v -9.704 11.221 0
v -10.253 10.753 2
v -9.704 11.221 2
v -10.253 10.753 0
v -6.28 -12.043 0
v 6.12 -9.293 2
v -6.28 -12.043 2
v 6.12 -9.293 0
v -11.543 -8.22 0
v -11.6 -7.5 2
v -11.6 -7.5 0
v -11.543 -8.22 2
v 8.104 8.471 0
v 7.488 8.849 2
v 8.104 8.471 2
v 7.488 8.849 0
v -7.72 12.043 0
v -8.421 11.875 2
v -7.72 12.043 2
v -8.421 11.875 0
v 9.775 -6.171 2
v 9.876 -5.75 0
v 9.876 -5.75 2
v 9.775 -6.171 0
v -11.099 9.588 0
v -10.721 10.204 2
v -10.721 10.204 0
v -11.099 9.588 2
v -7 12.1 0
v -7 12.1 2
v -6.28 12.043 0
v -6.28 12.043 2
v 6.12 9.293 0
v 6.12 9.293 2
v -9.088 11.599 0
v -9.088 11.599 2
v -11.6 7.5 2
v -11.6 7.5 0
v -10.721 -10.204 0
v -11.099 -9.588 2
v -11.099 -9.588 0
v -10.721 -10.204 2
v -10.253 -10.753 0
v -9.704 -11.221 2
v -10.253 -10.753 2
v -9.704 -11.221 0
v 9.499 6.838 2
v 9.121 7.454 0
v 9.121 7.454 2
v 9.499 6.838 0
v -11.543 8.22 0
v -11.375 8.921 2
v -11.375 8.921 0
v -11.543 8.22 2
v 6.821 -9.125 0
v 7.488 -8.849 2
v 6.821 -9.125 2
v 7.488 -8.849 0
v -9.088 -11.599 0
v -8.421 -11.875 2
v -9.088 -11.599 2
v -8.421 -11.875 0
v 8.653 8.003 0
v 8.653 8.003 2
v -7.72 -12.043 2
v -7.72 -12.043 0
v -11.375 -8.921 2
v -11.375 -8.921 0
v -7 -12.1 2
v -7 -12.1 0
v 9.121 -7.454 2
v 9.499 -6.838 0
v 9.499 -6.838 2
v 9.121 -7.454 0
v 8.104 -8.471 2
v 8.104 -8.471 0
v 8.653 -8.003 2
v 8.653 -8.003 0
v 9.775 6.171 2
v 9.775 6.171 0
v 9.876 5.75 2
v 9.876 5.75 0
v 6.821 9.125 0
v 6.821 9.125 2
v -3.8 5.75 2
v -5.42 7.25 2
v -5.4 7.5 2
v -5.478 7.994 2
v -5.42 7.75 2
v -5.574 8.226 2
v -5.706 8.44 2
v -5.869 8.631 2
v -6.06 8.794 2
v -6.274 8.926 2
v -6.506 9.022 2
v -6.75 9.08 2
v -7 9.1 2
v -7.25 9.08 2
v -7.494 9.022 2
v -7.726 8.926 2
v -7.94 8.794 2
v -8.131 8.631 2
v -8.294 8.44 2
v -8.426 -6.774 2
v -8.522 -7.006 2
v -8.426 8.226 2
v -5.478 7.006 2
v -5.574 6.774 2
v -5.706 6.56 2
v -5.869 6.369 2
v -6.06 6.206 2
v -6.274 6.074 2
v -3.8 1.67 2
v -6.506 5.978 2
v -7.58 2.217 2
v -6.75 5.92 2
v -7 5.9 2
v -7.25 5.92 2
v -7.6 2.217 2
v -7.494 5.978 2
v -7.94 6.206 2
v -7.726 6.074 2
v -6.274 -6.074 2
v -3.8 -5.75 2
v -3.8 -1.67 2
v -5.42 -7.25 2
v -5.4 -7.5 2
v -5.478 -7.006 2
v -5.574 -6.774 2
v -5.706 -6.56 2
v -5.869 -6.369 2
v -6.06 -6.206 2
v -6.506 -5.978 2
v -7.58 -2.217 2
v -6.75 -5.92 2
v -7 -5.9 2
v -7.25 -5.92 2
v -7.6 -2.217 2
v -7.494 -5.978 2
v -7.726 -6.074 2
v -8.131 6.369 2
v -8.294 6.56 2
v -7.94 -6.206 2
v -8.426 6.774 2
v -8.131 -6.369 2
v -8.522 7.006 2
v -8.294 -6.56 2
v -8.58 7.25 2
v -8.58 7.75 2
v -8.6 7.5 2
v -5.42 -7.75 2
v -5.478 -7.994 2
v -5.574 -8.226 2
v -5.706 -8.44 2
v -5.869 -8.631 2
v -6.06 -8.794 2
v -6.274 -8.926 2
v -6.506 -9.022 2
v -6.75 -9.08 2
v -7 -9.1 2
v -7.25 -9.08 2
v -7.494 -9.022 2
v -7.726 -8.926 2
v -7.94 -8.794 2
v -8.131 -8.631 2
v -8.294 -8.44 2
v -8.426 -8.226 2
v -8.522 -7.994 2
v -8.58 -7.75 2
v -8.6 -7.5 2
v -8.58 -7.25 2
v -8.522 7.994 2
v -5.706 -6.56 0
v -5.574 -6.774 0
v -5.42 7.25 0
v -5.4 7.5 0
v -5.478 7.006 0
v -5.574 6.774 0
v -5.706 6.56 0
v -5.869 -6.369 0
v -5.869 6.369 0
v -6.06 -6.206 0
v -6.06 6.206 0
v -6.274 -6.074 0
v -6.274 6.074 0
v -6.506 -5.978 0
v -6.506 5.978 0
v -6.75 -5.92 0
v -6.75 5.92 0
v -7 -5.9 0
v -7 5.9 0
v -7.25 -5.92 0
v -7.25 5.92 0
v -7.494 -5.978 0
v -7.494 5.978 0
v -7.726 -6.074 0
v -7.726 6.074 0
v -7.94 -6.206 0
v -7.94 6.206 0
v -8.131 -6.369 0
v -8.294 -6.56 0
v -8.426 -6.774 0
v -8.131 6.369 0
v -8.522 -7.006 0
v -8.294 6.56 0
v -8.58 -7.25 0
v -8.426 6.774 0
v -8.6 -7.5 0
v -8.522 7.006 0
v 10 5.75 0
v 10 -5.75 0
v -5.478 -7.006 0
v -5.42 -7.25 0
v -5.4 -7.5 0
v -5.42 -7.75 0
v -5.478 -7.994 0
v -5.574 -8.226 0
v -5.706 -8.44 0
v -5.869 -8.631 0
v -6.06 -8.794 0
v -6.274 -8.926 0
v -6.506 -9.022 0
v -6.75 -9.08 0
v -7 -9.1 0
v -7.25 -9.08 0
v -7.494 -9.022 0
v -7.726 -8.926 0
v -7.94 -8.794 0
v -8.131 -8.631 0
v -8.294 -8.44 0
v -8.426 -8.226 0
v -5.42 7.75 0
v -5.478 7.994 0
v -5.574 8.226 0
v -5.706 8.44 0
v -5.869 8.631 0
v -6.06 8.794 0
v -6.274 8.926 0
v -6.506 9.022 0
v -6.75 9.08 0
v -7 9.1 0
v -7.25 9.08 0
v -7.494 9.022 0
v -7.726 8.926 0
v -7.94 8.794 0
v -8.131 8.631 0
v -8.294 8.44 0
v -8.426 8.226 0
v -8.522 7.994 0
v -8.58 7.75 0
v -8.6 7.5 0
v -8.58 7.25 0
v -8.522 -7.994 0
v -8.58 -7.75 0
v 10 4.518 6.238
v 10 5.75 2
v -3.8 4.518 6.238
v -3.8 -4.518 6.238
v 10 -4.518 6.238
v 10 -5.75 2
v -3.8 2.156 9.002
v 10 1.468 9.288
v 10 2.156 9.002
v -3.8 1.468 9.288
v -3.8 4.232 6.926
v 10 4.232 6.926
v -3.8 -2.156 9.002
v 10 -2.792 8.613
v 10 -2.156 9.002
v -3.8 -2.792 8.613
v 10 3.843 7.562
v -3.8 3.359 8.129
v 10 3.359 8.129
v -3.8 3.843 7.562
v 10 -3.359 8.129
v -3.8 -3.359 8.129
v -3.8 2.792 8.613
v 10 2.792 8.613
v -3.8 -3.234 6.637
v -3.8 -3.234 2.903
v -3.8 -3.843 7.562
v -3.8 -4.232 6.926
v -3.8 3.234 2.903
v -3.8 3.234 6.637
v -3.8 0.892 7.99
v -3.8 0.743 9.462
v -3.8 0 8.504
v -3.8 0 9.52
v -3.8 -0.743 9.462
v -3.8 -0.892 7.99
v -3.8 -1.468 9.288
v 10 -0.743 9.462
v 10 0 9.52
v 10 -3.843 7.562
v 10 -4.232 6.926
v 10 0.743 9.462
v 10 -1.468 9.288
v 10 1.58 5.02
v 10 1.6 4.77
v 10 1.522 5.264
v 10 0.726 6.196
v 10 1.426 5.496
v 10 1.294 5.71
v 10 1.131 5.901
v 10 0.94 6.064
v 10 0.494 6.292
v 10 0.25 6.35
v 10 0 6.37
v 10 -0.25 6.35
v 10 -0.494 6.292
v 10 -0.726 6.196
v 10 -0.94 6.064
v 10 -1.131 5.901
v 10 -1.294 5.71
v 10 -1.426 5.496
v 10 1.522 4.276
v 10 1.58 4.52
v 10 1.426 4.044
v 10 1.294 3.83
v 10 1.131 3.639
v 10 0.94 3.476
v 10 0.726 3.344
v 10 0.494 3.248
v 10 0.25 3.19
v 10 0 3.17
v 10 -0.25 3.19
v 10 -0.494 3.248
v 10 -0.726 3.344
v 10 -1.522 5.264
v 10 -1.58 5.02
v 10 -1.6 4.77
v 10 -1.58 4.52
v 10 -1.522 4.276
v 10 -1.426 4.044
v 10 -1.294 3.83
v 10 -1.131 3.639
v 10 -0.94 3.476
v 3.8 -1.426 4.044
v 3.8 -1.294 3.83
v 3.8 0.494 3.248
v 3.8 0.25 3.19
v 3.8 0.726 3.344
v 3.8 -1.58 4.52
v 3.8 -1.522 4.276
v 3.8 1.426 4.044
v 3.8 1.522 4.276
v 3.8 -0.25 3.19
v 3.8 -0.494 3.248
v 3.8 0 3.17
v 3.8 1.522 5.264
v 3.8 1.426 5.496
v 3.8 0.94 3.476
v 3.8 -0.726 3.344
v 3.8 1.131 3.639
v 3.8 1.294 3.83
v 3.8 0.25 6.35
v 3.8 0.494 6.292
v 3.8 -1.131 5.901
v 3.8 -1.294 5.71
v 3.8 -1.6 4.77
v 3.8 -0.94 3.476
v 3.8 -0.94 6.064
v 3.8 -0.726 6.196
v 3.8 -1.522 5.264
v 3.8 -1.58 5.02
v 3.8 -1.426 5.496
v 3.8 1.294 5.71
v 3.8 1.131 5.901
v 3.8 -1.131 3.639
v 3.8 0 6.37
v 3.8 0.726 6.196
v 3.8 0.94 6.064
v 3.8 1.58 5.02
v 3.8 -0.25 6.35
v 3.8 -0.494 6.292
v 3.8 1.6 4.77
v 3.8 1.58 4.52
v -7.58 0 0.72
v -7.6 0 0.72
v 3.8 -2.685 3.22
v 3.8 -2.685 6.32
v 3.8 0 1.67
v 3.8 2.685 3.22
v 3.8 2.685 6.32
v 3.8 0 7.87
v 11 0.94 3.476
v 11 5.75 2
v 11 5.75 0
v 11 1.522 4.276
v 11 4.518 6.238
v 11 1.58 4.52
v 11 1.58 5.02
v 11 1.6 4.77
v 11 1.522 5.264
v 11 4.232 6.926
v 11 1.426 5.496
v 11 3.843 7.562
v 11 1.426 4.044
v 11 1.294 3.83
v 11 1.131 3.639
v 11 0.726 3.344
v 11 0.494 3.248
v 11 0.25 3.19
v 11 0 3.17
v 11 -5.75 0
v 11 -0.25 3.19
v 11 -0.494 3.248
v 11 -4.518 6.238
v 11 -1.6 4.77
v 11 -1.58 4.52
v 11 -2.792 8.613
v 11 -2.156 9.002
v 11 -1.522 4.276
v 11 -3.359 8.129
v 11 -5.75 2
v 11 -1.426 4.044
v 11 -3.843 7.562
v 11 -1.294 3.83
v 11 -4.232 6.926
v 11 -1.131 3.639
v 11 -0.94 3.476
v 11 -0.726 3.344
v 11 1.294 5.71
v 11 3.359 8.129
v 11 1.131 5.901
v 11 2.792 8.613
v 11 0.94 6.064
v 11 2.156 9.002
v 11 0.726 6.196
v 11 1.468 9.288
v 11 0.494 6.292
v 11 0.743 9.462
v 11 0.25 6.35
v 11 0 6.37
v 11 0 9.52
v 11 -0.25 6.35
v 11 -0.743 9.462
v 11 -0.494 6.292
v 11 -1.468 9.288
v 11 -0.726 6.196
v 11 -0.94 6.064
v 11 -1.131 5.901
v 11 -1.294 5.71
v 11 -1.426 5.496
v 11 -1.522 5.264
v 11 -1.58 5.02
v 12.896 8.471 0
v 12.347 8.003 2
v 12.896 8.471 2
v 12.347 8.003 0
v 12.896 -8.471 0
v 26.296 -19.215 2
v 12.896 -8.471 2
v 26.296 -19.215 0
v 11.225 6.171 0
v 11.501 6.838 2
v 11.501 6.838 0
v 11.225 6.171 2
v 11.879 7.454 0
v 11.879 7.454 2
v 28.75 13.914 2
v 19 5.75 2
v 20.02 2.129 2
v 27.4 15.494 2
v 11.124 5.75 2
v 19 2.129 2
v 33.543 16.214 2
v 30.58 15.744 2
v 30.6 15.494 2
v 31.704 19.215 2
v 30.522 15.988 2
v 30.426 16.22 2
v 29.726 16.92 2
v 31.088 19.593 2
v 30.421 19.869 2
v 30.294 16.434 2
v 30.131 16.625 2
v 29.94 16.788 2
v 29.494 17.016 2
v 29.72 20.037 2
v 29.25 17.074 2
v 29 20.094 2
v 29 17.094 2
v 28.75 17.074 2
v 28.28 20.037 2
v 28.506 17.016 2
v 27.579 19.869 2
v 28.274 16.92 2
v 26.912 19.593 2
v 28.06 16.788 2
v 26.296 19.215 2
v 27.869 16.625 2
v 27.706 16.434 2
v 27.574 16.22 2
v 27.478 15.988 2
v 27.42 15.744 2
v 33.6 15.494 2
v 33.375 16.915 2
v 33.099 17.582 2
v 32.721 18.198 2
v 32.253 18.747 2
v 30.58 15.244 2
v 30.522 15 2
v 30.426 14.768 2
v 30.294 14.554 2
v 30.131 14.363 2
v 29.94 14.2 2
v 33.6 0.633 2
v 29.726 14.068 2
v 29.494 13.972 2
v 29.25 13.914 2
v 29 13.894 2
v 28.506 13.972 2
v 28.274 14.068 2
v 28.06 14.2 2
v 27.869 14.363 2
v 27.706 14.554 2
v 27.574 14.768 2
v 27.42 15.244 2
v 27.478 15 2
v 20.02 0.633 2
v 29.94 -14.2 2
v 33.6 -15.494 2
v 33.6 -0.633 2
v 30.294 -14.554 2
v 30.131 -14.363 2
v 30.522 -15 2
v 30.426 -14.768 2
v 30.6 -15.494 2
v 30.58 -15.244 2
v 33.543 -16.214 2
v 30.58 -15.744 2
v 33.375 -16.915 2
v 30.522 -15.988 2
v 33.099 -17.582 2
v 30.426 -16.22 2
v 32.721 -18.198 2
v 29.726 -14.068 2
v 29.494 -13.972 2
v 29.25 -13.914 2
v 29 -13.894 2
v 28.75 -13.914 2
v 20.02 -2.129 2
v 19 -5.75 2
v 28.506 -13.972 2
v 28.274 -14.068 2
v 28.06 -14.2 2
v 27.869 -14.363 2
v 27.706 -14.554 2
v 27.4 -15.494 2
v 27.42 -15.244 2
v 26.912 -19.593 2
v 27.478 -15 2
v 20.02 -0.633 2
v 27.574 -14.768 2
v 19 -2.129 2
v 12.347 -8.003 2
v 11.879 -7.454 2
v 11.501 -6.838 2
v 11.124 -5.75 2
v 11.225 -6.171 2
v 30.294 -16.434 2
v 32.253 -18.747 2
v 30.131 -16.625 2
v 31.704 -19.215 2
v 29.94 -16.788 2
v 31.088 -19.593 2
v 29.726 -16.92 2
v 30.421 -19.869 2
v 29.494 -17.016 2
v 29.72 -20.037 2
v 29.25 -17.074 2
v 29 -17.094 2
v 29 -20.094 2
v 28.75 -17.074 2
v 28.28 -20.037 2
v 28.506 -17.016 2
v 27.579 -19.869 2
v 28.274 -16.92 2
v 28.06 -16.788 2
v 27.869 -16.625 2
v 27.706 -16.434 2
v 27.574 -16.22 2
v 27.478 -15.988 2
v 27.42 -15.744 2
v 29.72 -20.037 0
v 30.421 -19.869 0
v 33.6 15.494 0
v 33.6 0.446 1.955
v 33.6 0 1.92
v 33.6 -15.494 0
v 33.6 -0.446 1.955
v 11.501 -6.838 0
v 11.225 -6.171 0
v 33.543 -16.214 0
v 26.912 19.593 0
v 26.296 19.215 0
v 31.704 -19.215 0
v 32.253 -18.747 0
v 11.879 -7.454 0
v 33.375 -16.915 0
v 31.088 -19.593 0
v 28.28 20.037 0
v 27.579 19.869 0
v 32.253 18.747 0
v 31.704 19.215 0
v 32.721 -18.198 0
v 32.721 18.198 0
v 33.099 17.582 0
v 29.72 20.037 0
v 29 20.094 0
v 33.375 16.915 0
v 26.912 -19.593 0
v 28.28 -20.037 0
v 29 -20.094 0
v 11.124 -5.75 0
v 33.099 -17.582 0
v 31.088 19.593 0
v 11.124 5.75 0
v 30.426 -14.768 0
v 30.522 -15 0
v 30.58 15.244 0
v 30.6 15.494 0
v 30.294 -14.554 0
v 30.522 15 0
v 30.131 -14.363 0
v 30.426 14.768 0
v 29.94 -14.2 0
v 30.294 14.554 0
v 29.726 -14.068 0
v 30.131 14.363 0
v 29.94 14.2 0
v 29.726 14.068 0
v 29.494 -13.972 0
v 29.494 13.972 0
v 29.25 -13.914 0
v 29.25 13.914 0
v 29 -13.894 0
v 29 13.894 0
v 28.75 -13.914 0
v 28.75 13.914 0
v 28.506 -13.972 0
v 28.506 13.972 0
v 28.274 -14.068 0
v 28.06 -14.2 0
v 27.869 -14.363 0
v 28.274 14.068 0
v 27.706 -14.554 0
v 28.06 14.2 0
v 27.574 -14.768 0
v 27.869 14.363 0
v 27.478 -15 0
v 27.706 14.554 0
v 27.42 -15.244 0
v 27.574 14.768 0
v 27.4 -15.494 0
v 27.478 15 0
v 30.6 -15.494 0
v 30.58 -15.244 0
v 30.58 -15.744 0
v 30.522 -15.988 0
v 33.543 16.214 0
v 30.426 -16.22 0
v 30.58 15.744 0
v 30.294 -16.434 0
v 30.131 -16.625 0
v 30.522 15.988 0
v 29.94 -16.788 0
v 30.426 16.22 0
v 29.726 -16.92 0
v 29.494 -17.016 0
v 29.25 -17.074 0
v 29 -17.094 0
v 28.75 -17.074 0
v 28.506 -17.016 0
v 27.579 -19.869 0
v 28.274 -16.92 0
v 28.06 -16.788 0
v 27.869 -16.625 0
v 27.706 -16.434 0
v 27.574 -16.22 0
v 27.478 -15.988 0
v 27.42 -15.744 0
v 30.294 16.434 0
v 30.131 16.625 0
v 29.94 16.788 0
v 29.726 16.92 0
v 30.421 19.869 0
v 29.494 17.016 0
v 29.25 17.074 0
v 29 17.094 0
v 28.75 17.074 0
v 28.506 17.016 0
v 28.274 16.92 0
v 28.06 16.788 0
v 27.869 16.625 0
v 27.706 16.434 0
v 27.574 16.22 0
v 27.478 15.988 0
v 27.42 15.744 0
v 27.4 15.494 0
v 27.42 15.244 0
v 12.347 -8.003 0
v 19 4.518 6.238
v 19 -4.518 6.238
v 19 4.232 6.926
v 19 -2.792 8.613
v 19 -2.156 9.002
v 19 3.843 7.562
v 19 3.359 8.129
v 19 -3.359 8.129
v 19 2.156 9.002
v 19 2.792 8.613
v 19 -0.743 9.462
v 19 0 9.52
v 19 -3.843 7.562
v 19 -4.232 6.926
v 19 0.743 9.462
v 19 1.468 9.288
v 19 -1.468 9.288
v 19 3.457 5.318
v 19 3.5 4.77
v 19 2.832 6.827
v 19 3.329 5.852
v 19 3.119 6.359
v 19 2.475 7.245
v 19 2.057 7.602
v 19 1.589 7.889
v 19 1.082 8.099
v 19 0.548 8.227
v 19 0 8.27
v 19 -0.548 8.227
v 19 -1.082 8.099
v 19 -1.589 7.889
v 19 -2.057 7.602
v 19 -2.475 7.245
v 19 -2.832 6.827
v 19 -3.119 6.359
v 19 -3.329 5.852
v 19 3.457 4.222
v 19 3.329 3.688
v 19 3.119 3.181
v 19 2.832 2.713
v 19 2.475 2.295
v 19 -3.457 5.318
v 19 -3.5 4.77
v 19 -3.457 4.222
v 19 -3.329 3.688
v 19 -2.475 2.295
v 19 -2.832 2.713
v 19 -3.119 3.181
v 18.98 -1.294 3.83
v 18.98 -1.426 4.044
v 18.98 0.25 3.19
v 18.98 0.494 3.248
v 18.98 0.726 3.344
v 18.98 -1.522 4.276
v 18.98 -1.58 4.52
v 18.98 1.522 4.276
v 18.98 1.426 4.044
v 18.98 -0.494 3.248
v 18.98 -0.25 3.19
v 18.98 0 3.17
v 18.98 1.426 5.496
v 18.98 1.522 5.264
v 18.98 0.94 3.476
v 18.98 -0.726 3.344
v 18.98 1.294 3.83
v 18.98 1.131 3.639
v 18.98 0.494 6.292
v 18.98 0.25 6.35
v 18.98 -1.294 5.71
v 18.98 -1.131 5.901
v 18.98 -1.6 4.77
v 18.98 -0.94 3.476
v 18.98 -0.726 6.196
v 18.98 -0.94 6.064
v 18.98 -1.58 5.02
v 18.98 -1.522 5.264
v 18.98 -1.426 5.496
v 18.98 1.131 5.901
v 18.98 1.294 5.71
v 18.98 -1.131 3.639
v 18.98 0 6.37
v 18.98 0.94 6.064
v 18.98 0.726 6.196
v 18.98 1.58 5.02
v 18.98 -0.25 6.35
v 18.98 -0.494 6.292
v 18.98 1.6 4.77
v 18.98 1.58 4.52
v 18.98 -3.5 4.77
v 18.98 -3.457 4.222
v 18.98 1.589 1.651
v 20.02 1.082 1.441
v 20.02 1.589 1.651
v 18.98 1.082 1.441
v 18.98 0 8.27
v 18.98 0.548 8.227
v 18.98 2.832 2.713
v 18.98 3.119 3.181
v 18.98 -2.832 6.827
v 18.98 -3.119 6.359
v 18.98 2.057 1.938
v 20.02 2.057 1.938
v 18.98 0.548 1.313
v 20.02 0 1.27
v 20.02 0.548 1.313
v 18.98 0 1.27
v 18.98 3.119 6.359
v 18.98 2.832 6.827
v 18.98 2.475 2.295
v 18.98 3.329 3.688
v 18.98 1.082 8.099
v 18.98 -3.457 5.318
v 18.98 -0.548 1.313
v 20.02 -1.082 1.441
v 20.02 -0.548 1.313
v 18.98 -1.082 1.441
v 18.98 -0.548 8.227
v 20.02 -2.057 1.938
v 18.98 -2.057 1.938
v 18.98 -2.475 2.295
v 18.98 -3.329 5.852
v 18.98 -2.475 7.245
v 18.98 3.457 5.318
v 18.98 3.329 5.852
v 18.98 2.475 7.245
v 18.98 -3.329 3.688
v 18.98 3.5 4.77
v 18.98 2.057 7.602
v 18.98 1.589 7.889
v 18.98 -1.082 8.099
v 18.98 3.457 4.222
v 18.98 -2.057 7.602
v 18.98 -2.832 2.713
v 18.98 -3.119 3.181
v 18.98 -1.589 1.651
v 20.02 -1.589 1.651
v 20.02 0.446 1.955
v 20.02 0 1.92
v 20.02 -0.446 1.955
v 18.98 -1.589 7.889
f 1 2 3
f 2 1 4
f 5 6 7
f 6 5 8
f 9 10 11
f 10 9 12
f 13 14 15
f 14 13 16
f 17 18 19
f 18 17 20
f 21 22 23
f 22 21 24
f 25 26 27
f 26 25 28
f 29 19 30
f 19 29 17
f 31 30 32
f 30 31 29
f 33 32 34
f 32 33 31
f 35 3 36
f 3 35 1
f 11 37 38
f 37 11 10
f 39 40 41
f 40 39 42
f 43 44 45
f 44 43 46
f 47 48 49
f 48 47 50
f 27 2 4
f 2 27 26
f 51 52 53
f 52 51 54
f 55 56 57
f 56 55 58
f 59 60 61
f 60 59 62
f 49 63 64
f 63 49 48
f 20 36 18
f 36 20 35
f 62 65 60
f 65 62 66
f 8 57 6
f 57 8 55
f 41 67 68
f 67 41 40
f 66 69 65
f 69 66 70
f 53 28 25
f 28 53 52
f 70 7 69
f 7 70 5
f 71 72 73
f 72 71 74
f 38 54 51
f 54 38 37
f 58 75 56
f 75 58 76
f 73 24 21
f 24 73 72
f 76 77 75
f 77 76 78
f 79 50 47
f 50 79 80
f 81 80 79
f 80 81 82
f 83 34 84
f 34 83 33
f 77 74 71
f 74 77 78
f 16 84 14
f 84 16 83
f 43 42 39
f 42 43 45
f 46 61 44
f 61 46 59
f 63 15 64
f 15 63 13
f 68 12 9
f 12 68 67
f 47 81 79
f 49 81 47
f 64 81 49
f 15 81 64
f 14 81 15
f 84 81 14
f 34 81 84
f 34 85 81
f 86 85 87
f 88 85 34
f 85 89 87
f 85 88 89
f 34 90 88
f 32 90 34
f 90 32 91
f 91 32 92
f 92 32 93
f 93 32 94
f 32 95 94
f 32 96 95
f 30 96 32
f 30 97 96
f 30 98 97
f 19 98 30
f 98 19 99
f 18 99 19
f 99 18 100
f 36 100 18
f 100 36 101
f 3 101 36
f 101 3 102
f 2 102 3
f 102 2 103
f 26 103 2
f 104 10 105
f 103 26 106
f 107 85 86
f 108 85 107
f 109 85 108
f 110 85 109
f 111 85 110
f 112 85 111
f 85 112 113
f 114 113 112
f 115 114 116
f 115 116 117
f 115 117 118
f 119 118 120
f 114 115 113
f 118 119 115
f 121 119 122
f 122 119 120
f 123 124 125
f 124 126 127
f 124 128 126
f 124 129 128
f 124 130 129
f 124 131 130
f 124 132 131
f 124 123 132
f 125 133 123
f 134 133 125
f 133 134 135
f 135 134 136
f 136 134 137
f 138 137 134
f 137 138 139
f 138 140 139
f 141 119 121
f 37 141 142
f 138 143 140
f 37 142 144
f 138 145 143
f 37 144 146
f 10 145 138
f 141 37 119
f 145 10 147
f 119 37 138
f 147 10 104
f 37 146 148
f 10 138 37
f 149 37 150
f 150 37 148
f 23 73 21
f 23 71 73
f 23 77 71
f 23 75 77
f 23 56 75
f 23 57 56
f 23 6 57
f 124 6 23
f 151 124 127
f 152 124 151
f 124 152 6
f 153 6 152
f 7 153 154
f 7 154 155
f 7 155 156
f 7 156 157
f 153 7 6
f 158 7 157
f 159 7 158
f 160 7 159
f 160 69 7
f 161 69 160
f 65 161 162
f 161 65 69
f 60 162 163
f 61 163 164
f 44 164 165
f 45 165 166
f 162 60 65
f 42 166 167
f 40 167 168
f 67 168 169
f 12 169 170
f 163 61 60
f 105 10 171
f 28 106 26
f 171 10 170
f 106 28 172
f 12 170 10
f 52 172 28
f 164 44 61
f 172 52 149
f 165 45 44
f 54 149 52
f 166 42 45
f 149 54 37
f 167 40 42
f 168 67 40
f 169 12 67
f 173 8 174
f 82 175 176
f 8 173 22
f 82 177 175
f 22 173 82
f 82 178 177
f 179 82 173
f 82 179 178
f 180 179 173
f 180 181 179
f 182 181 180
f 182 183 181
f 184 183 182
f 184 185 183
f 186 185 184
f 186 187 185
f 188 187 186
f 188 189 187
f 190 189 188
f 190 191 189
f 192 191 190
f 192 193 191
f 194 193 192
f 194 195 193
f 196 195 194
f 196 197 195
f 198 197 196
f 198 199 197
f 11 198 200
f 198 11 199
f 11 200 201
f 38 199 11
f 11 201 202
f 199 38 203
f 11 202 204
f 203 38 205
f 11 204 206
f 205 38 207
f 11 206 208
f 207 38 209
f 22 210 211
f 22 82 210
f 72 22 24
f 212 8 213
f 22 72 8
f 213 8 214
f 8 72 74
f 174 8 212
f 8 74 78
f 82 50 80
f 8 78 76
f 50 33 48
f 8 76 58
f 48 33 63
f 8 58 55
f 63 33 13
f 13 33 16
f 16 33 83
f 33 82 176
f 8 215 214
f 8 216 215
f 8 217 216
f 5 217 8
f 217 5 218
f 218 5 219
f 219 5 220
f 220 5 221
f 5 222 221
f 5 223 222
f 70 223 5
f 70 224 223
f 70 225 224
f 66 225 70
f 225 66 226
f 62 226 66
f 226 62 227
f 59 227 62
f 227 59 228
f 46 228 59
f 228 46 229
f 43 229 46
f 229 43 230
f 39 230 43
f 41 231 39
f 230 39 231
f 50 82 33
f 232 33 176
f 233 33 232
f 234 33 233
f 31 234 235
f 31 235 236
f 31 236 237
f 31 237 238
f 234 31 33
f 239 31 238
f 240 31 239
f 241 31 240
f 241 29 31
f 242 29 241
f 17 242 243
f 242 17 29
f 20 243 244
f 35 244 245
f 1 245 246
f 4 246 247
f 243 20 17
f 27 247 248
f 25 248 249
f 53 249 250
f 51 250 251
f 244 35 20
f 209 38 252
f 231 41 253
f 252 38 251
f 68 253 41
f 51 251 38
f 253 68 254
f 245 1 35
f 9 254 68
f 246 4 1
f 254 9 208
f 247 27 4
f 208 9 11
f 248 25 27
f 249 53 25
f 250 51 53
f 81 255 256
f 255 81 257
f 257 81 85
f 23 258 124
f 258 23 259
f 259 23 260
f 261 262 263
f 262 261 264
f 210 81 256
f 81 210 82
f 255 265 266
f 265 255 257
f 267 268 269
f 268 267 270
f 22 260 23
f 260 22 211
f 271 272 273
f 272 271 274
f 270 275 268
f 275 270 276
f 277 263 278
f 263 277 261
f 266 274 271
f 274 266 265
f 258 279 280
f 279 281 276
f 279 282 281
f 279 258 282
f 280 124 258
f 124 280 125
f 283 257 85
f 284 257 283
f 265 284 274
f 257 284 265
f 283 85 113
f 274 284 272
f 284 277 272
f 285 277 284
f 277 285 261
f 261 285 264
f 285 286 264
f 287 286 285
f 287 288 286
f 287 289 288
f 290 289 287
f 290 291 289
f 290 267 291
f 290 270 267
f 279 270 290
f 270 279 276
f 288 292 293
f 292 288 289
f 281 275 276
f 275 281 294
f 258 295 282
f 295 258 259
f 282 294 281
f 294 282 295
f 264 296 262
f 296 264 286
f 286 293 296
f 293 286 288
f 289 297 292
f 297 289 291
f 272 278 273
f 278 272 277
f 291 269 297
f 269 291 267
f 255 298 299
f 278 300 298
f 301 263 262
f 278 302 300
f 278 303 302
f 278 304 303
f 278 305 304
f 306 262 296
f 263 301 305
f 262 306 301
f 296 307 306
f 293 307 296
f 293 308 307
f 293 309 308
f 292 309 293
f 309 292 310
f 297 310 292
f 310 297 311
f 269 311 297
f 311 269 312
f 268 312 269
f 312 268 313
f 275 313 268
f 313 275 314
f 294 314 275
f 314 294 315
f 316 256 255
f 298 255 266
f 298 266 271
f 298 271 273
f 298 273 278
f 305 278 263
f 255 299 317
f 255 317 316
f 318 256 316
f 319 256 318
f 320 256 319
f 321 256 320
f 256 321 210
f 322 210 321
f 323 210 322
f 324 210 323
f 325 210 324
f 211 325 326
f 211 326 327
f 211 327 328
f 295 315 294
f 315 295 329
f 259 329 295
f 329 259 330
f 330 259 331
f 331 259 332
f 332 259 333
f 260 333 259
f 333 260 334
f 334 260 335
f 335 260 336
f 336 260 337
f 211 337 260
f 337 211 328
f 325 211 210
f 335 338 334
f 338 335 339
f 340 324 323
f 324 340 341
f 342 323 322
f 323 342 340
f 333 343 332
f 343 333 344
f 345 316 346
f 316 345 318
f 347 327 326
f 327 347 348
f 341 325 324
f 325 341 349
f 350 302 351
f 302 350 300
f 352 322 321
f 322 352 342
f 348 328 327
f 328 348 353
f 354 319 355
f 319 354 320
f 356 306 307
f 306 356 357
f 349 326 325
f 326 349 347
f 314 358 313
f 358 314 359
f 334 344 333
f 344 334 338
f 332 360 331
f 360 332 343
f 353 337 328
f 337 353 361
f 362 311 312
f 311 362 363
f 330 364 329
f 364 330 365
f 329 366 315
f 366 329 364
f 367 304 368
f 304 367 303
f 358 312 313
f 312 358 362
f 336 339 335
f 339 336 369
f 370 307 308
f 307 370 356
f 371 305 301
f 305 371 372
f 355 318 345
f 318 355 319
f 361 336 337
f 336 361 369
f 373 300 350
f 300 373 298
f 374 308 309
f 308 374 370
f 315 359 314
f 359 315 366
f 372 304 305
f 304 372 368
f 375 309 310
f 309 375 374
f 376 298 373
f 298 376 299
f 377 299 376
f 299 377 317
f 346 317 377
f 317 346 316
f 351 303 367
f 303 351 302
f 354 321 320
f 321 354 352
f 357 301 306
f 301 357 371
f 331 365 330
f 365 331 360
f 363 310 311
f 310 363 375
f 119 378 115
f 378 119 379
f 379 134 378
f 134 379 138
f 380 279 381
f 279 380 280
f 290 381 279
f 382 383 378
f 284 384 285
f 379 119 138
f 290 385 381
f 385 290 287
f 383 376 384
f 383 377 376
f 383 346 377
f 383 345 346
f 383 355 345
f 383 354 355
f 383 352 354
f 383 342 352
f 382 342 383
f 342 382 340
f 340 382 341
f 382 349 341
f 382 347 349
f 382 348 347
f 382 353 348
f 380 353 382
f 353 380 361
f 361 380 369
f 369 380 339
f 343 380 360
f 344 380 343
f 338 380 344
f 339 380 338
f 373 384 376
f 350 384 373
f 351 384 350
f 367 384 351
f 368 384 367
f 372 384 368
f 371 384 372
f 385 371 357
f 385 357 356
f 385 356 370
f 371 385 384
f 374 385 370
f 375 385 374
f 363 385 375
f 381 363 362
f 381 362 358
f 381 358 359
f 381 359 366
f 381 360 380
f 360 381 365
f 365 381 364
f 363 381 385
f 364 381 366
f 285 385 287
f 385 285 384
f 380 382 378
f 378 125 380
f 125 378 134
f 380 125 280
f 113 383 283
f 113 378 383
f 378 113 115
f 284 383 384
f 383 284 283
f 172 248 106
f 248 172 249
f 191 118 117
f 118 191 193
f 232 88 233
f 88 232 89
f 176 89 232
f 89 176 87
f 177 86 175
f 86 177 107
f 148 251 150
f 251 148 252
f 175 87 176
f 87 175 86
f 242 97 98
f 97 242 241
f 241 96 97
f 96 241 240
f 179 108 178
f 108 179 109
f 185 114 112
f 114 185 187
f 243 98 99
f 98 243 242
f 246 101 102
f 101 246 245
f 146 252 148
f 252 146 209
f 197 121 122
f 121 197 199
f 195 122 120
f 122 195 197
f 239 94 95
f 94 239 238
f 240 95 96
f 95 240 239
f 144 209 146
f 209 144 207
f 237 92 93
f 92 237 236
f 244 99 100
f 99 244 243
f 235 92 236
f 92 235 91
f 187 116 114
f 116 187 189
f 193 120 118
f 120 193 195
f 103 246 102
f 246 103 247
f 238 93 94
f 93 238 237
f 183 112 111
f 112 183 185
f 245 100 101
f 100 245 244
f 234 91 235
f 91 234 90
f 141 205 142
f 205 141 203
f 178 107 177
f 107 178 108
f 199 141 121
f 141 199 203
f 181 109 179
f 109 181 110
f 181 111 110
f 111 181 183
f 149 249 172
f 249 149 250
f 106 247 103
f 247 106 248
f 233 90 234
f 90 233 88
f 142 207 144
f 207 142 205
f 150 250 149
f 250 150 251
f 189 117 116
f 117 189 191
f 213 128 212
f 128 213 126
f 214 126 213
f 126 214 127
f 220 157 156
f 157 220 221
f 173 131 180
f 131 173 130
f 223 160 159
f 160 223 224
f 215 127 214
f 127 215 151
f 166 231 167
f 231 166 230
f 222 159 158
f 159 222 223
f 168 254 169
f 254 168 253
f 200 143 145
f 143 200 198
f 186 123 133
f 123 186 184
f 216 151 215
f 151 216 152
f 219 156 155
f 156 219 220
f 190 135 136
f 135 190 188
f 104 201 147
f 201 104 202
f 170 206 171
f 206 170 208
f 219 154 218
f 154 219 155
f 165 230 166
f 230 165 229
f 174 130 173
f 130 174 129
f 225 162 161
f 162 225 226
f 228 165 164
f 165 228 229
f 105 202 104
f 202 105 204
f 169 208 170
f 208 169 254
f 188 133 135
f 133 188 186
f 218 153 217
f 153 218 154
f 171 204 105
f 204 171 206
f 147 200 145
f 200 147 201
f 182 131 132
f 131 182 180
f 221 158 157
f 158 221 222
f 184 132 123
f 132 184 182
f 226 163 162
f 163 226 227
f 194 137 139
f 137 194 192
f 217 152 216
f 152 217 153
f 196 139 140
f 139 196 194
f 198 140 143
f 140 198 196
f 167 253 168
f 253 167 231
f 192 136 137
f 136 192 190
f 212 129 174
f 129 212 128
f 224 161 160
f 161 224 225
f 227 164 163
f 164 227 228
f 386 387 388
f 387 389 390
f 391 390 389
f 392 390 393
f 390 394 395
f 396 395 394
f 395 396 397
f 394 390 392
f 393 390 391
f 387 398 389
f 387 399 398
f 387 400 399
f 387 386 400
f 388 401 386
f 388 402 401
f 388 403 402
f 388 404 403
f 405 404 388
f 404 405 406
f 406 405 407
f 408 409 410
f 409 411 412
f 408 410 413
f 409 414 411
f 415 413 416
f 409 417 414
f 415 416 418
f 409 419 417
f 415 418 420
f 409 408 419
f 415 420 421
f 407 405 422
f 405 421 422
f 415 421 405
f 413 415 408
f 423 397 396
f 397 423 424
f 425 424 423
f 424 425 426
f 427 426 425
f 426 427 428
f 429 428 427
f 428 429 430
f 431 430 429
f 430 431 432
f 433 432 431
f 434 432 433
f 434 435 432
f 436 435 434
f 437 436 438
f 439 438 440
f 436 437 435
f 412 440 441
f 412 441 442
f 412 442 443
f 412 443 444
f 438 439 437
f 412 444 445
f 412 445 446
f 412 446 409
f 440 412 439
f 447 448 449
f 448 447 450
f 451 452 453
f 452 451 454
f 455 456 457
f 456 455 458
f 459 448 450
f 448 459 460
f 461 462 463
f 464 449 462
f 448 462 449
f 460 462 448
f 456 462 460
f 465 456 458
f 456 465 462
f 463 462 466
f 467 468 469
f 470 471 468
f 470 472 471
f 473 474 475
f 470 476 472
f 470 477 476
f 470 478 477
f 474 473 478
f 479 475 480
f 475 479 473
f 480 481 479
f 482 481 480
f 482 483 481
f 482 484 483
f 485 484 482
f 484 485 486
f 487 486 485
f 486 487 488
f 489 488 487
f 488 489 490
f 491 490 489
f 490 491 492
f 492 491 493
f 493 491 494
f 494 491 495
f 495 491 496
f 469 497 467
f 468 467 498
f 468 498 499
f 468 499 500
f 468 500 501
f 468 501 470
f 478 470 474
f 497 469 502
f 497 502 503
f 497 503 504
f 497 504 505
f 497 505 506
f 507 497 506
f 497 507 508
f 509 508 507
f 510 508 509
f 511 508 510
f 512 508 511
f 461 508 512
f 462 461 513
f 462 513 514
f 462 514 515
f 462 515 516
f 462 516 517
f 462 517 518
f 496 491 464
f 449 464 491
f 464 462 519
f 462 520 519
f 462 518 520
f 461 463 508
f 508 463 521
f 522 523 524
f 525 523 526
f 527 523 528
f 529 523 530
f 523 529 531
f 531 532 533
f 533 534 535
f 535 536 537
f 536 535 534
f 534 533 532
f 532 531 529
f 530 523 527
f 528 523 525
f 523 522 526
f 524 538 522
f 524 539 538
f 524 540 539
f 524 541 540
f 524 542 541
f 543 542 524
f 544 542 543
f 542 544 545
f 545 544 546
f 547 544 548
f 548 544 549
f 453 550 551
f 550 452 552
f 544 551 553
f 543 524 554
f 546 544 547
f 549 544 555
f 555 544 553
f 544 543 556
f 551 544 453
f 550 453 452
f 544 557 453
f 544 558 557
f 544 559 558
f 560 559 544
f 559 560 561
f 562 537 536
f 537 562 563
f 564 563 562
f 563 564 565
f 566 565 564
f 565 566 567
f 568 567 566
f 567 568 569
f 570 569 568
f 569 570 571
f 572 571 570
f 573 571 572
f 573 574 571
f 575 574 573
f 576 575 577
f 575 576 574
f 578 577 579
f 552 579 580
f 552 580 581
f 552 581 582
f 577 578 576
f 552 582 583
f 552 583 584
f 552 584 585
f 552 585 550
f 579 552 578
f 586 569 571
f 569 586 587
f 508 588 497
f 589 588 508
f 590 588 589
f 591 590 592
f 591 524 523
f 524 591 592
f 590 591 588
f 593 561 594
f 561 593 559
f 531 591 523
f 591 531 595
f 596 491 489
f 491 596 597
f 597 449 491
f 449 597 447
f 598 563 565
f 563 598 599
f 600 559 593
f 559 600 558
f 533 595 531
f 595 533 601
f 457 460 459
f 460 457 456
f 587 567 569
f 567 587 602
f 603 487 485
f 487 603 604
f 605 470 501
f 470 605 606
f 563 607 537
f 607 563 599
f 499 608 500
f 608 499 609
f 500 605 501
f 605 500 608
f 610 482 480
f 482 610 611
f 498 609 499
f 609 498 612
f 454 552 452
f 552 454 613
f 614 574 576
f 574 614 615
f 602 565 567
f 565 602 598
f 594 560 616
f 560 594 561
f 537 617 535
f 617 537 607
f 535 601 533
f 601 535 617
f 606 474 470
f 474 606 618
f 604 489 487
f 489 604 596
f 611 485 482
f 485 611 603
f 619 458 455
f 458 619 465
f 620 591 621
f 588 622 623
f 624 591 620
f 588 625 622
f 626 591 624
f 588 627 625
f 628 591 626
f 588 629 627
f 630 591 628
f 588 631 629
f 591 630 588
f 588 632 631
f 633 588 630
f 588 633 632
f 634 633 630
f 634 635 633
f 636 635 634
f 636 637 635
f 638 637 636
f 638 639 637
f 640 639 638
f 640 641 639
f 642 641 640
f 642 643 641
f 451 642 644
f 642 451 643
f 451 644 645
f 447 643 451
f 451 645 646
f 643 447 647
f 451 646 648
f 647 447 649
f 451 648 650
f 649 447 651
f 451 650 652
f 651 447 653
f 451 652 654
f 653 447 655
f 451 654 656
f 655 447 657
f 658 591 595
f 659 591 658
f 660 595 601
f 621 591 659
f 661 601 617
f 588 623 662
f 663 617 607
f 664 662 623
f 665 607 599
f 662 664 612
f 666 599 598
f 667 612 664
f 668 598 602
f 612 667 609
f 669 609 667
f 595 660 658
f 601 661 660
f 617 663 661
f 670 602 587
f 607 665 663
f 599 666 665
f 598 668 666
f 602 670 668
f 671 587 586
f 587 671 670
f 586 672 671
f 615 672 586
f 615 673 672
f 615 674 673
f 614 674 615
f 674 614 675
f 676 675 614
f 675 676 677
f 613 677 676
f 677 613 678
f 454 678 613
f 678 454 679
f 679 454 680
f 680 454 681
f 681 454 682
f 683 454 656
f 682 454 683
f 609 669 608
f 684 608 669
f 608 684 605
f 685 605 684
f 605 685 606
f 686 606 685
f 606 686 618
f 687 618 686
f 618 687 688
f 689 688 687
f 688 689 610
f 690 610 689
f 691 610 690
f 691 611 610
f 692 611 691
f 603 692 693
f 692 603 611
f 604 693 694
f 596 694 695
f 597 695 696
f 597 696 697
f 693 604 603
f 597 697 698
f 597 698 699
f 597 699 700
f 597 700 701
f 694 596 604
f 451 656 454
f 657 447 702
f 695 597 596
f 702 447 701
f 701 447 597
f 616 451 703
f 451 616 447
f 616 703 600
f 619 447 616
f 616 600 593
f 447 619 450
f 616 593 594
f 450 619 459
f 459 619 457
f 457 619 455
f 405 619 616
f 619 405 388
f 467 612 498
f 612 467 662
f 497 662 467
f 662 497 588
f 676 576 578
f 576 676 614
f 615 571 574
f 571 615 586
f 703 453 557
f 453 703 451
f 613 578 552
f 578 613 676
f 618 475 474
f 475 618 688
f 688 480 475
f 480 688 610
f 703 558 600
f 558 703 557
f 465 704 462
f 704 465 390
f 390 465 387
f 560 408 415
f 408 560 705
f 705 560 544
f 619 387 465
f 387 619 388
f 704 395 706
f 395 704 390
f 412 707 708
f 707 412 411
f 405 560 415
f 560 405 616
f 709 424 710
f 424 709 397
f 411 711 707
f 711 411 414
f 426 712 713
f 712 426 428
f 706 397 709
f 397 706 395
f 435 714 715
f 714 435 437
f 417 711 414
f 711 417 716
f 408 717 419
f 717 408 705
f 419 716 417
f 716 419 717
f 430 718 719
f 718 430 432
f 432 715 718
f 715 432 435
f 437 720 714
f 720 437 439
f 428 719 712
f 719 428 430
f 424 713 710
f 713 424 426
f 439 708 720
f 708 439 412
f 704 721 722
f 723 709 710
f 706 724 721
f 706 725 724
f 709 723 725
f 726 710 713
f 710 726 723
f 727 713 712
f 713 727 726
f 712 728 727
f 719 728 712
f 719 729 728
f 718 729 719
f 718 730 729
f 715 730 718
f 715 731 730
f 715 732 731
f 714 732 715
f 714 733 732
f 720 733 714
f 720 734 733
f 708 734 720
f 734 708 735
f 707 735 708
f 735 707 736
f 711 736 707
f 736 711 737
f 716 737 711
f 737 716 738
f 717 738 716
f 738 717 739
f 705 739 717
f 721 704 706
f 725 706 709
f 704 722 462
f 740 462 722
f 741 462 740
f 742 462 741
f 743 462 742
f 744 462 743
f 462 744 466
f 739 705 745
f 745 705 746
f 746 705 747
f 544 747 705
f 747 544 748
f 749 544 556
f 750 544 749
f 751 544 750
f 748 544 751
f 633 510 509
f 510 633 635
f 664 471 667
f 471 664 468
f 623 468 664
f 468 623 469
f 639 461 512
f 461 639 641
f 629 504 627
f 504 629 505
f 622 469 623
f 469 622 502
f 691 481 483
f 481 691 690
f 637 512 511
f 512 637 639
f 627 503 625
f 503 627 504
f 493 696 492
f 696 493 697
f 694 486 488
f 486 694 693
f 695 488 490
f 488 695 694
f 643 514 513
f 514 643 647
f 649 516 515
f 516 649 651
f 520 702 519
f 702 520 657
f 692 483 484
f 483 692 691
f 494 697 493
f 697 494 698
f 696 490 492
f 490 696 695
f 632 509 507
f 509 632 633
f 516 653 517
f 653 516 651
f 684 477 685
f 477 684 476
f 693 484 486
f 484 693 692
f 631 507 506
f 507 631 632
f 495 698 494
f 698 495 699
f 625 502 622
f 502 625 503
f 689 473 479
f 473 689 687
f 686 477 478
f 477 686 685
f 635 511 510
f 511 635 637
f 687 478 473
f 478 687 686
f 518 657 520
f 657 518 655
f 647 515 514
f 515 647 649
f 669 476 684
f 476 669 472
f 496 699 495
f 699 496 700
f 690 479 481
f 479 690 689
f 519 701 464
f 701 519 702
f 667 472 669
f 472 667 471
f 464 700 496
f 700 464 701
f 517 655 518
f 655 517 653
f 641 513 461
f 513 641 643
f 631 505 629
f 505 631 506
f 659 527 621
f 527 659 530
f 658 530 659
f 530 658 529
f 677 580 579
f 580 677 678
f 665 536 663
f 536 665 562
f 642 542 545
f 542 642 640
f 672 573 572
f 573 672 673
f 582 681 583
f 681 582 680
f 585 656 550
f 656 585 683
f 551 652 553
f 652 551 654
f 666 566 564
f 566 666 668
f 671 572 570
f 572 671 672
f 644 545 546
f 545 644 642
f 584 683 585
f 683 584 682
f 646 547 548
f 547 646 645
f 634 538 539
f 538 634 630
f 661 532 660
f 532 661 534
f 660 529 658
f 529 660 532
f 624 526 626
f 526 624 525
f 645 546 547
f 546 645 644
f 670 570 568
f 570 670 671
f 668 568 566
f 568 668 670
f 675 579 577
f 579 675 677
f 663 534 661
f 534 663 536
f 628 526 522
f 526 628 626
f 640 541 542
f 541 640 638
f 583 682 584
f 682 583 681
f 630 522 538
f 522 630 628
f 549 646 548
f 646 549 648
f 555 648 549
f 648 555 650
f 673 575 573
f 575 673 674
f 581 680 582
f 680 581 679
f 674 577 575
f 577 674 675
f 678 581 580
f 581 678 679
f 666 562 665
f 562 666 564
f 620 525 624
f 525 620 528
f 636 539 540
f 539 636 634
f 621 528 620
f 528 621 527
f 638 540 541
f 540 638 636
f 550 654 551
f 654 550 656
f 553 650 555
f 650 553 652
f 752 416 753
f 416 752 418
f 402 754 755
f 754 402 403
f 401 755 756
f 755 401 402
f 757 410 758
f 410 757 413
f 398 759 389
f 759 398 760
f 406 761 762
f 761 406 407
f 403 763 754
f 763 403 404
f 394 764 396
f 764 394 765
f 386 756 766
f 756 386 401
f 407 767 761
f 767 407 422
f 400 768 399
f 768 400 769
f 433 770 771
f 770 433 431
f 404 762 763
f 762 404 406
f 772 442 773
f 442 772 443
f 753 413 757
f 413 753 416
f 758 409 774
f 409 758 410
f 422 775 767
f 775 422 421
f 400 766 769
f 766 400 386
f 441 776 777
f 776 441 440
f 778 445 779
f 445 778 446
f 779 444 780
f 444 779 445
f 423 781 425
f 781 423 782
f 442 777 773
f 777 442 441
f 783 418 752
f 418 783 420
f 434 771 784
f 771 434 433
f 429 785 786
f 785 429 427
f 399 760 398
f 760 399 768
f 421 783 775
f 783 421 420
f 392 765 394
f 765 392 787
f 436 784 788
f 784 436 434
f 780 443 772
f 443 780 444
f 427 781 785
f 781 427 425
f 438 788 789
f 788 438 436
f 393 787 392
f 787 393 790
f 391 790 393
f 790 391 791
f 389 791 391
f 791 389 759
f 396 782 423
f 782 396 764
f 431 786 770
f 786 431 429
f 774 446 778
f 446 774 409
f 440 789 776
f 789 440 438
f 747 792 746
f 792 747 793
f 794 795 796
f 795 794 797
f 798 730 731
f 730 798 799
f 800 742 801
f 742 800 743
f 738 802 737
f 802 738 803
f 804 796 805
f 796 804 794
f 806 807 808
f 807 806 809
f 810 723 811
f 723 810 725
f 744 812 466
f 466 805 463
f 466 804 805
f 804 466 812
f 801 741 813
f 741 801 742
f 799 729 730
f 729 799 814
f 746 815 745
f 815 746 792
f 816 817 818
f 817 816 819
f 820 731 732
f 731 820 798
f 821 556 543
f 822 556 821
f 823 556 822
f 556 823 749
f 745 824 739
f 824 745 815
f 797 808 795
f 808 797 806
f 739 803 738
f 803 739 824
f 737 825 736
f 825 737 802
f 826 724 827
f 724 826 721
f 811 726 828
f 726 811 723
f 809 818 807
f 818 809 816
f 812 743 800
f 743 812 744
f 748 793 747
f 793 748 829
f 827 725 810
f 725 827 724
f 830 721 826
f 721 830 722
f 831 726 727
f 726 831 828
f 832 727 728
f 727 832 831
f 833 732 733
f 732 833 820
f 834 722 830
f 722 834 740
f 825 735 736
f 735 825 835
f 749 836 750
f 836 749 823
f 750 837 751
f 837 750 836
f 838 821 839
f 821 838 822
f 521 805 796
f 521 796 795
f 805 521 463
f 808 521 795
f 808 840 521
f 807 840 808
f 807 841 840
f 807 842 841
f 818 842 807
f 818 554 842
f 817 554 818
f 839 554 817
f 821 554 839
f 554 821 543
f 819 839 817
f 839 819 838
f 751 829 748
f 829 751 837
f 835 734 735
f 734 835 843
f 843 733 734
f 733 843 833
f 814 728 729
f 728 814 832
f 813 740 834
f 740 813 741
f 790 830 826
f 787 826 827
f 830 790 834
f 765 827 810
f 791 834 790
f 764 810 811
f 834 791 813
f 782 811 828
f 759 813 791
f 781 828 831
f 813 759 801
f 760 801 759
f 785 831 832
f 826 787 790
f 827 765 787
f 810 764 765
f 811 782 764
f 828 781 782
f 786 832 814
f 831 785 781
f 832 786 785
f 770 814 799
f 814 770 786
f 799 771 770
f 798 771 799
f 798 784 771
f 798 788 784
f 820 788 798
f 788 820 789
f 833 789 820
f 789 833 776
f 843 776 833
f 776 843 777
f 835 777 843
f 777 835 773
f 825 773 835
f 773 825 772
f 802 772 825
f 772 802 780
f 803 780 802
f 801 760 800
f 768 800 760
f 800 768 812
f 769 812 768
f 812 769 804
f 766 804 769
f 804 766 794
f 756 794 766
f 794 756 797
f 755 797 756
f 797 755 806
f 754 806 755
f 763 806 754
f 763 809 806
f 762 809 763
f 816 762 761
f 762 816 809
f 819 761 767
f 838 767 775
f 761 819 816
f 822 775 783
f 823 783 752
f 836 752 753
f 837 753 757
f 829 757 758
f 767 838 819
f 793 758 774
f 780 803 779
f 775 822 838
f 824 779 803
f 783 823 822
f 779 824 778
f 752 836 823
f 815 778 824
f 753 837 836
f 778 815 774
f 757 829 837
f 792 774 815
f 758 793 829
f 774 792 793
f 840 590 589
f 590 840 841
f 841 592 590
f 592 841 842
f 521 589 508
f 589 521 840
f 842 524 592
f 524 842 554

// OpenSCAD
//
// stepper_tensioner (rev 3) - 20121118-1017
//
// (c)Jeremie Francois (jeremie.francois@gmail.com)
//	http://www.thingiverse.com/MoonCactus
//	http://betterprinter.blogspot.com
//
// Licence: Attribution - Share Alike - Creative Commons
//

$fn=40;
tol=0.02;

main_th= 2; // base plate thickness

m3_d= 3;
m3_d_free= 3 + 0.2;
m3_head_d= 5.5 + 0.2;
m3_nylock_th= 3.8;
m3_nylock_d= 6.1 + 0.1;
m3_nylock_d_freeplay= 6.1 + 2.0;
m3_washer= 6.8 + 0.2;
m3_washer_th= 0.5 + 0.5;

holder_margin= 3; // margin around screw holes
balance_distance= 3; // leave some length on the motor side!
idle_holder_len= 8; // how long is the "tunnel" that hold the screw head
lock_holder_len= 10; // how long is the "tunnel" that hold nylock nut

// Swap the two spacing_xxx and set balance to zero if you want the adjustment screw head to point downwards
spacing_lock_side= 15; // narrow side
hole_d_lock_side= m3_d_free;

// NEMA 17 dimensions
spacing_idle_side= 1.220*2.54*10; // mounting holes distance (31mm)
hole_d_idle_side= m3_d_free; // add 6mm for a piece of bowden as thermal insulator

// How thick are the walls around the adjusting screw
holder_nut_wall_th= 9.5; // must be > m3_washer

// Misc computed dimensions
holder_width= holder_nut_wall_th/2;
motor_margin= 10-balance_distance;
idle_holder_hole_x= 15 + balance_distance;
ear_r= hole_d_lock_side/2+holder_margin;

module motor_side()
{
	difference()
	{
		union()
		{
			difference()
			{
				union()
				{
					// The motor plate
					hull()
					{
						translate([-motor_margin,0,0])
						{
							translate([0,+spacing_lock_side/2,0]) cylinder(r=ear_r, h=main_th);
							translate([0,-spacing_lock_side/2,0]) cylinder(r=ear_r, h=main_th);
						}
						translate([lock_holder_len-ear_r,0,0])
						{
							translate([0,+holder_width,0]) cylinder(r=ear_r, h=main_th);
							translate([0,-holder_width,0]) cylinder(r=ear_r, h=main_th);
						}
					}
					// The screw nest on the motor plate
					translate([-m3_nylock_th,0,0])
						screw_nest(lock_holder_len + m3_nylock_th);
				}
				// The m3 void
				translate([lock_holder_len-lock_holder_len-tol,0,holder_nut_wall_th/2+tol])
					rotate([0,90,0])
						cylinder(r=m3_d_free/2, h= lock_holder_len+20);

				// The m3 nylock hole
				translate([0,0,holder_nut_wall_th/2+tol])
				{
					hull()
					{
						// tight
						rotate([0,90,0])
							cylinder(r=m3_nylock_d/2, h= m3_nylock_th, $fn=6);
						// conic
						translate([-m3_nylock_th-m3_nylock_th,0,0])
							rotate([0,90,0])
								cylinder(r=m3_nylock_d_freeplay/2, h= tol, $fn=6);
					}
				}
			}
		}

		// Remove holes
		translate([0,0,-tol])
		{
			// Screw mount holes with some freeplay
			translate([-motor_margin,+spacing_lock_side/2,0]) cylinder(r=hole_d_lock_side/2, h=main_th+2*tol);
			translate([-motor_margin,-spacing_lock_side/2,0]) cylinder(r=hole_d_lock_side/2, h=main_th+2*tol);
		}
		// Make sure it's flat on the bottom
		translate([-50,-50,-100]) cube([100,100,100]);
	}
}

module screw_nest(len)
{
	hull()
	{
		translate([0,-holder_nut_wall_th/2-1,0])
			cube([len,holder_nut_wall_th+2,main_th]);

		translate([0,0,holder_nut_wall_th/2+tol])
			rotate([0,90,0])
				cylinder(r=holder_nut_wall_th/2, h= len);
	}
}


module fixed_side()
{
	translate([lock_holder_len+1,0,0])
	{
		difference()
		{
			union()
			{
				// plate
				hull()
				{
					translate([ear_r,0,0])
					{
						translate([0,+holder_width,0]) cylinder(r=ear_r, h=main_th);
						translate([0,-holder_width,0]) cylinder(r=ear_r, h=main_th);
					}
					translate([idle_holder_hole_x,0,0])
					{
						translate([0,+spacing_idle_side/2,0]) cylinder(r=hole_d_idle_side/2+holder_margin, h=main_th);
						translate([0,-spacing_idle_side/2,0]) cylinder(r=hole_d_idle_side/2+holder_margin, h=main_th);
					}
				}
				screw_nest(idle_holder_len);
			}

			// The m3 void
			translate([-tol,0,holder_nut_wall_th/2+tol])
				rotate([0,90,0])
					cylinder(r=m3_d_free/2, h= idle_holder_len+2*tol);
			// The m3 washer void
			translate([-tol+idle_holder_len,0,holder_nut_wall_th/2+tol])
				rotate([0,90,0])
					cylinder(r=m3_washer/2, h= m3_washer_th+2*tol);
			// The m3 head void
			translate([-tol+idle_holder_len+1,0,holder_nut_wall_th/2+tol])
				rotate([0,90,0])
					cylinder(r=m3_head_d/2, h= idle_holder_len+2*tol+100);

			translate([idle_holder_hole_x,0,-tol])
			{
				translate([0,+spacing_idle_side/2,0]) cylinder(r=hole_d_idle_side/2, h=main_th+2*tol);
				translate([0,-spacing_idle_side/2,0]) cylinder(r=hole_d_idle_side/2, h=main_th+2*tol);
			}

		}
	}
}

motor_side();

fixed_side();
